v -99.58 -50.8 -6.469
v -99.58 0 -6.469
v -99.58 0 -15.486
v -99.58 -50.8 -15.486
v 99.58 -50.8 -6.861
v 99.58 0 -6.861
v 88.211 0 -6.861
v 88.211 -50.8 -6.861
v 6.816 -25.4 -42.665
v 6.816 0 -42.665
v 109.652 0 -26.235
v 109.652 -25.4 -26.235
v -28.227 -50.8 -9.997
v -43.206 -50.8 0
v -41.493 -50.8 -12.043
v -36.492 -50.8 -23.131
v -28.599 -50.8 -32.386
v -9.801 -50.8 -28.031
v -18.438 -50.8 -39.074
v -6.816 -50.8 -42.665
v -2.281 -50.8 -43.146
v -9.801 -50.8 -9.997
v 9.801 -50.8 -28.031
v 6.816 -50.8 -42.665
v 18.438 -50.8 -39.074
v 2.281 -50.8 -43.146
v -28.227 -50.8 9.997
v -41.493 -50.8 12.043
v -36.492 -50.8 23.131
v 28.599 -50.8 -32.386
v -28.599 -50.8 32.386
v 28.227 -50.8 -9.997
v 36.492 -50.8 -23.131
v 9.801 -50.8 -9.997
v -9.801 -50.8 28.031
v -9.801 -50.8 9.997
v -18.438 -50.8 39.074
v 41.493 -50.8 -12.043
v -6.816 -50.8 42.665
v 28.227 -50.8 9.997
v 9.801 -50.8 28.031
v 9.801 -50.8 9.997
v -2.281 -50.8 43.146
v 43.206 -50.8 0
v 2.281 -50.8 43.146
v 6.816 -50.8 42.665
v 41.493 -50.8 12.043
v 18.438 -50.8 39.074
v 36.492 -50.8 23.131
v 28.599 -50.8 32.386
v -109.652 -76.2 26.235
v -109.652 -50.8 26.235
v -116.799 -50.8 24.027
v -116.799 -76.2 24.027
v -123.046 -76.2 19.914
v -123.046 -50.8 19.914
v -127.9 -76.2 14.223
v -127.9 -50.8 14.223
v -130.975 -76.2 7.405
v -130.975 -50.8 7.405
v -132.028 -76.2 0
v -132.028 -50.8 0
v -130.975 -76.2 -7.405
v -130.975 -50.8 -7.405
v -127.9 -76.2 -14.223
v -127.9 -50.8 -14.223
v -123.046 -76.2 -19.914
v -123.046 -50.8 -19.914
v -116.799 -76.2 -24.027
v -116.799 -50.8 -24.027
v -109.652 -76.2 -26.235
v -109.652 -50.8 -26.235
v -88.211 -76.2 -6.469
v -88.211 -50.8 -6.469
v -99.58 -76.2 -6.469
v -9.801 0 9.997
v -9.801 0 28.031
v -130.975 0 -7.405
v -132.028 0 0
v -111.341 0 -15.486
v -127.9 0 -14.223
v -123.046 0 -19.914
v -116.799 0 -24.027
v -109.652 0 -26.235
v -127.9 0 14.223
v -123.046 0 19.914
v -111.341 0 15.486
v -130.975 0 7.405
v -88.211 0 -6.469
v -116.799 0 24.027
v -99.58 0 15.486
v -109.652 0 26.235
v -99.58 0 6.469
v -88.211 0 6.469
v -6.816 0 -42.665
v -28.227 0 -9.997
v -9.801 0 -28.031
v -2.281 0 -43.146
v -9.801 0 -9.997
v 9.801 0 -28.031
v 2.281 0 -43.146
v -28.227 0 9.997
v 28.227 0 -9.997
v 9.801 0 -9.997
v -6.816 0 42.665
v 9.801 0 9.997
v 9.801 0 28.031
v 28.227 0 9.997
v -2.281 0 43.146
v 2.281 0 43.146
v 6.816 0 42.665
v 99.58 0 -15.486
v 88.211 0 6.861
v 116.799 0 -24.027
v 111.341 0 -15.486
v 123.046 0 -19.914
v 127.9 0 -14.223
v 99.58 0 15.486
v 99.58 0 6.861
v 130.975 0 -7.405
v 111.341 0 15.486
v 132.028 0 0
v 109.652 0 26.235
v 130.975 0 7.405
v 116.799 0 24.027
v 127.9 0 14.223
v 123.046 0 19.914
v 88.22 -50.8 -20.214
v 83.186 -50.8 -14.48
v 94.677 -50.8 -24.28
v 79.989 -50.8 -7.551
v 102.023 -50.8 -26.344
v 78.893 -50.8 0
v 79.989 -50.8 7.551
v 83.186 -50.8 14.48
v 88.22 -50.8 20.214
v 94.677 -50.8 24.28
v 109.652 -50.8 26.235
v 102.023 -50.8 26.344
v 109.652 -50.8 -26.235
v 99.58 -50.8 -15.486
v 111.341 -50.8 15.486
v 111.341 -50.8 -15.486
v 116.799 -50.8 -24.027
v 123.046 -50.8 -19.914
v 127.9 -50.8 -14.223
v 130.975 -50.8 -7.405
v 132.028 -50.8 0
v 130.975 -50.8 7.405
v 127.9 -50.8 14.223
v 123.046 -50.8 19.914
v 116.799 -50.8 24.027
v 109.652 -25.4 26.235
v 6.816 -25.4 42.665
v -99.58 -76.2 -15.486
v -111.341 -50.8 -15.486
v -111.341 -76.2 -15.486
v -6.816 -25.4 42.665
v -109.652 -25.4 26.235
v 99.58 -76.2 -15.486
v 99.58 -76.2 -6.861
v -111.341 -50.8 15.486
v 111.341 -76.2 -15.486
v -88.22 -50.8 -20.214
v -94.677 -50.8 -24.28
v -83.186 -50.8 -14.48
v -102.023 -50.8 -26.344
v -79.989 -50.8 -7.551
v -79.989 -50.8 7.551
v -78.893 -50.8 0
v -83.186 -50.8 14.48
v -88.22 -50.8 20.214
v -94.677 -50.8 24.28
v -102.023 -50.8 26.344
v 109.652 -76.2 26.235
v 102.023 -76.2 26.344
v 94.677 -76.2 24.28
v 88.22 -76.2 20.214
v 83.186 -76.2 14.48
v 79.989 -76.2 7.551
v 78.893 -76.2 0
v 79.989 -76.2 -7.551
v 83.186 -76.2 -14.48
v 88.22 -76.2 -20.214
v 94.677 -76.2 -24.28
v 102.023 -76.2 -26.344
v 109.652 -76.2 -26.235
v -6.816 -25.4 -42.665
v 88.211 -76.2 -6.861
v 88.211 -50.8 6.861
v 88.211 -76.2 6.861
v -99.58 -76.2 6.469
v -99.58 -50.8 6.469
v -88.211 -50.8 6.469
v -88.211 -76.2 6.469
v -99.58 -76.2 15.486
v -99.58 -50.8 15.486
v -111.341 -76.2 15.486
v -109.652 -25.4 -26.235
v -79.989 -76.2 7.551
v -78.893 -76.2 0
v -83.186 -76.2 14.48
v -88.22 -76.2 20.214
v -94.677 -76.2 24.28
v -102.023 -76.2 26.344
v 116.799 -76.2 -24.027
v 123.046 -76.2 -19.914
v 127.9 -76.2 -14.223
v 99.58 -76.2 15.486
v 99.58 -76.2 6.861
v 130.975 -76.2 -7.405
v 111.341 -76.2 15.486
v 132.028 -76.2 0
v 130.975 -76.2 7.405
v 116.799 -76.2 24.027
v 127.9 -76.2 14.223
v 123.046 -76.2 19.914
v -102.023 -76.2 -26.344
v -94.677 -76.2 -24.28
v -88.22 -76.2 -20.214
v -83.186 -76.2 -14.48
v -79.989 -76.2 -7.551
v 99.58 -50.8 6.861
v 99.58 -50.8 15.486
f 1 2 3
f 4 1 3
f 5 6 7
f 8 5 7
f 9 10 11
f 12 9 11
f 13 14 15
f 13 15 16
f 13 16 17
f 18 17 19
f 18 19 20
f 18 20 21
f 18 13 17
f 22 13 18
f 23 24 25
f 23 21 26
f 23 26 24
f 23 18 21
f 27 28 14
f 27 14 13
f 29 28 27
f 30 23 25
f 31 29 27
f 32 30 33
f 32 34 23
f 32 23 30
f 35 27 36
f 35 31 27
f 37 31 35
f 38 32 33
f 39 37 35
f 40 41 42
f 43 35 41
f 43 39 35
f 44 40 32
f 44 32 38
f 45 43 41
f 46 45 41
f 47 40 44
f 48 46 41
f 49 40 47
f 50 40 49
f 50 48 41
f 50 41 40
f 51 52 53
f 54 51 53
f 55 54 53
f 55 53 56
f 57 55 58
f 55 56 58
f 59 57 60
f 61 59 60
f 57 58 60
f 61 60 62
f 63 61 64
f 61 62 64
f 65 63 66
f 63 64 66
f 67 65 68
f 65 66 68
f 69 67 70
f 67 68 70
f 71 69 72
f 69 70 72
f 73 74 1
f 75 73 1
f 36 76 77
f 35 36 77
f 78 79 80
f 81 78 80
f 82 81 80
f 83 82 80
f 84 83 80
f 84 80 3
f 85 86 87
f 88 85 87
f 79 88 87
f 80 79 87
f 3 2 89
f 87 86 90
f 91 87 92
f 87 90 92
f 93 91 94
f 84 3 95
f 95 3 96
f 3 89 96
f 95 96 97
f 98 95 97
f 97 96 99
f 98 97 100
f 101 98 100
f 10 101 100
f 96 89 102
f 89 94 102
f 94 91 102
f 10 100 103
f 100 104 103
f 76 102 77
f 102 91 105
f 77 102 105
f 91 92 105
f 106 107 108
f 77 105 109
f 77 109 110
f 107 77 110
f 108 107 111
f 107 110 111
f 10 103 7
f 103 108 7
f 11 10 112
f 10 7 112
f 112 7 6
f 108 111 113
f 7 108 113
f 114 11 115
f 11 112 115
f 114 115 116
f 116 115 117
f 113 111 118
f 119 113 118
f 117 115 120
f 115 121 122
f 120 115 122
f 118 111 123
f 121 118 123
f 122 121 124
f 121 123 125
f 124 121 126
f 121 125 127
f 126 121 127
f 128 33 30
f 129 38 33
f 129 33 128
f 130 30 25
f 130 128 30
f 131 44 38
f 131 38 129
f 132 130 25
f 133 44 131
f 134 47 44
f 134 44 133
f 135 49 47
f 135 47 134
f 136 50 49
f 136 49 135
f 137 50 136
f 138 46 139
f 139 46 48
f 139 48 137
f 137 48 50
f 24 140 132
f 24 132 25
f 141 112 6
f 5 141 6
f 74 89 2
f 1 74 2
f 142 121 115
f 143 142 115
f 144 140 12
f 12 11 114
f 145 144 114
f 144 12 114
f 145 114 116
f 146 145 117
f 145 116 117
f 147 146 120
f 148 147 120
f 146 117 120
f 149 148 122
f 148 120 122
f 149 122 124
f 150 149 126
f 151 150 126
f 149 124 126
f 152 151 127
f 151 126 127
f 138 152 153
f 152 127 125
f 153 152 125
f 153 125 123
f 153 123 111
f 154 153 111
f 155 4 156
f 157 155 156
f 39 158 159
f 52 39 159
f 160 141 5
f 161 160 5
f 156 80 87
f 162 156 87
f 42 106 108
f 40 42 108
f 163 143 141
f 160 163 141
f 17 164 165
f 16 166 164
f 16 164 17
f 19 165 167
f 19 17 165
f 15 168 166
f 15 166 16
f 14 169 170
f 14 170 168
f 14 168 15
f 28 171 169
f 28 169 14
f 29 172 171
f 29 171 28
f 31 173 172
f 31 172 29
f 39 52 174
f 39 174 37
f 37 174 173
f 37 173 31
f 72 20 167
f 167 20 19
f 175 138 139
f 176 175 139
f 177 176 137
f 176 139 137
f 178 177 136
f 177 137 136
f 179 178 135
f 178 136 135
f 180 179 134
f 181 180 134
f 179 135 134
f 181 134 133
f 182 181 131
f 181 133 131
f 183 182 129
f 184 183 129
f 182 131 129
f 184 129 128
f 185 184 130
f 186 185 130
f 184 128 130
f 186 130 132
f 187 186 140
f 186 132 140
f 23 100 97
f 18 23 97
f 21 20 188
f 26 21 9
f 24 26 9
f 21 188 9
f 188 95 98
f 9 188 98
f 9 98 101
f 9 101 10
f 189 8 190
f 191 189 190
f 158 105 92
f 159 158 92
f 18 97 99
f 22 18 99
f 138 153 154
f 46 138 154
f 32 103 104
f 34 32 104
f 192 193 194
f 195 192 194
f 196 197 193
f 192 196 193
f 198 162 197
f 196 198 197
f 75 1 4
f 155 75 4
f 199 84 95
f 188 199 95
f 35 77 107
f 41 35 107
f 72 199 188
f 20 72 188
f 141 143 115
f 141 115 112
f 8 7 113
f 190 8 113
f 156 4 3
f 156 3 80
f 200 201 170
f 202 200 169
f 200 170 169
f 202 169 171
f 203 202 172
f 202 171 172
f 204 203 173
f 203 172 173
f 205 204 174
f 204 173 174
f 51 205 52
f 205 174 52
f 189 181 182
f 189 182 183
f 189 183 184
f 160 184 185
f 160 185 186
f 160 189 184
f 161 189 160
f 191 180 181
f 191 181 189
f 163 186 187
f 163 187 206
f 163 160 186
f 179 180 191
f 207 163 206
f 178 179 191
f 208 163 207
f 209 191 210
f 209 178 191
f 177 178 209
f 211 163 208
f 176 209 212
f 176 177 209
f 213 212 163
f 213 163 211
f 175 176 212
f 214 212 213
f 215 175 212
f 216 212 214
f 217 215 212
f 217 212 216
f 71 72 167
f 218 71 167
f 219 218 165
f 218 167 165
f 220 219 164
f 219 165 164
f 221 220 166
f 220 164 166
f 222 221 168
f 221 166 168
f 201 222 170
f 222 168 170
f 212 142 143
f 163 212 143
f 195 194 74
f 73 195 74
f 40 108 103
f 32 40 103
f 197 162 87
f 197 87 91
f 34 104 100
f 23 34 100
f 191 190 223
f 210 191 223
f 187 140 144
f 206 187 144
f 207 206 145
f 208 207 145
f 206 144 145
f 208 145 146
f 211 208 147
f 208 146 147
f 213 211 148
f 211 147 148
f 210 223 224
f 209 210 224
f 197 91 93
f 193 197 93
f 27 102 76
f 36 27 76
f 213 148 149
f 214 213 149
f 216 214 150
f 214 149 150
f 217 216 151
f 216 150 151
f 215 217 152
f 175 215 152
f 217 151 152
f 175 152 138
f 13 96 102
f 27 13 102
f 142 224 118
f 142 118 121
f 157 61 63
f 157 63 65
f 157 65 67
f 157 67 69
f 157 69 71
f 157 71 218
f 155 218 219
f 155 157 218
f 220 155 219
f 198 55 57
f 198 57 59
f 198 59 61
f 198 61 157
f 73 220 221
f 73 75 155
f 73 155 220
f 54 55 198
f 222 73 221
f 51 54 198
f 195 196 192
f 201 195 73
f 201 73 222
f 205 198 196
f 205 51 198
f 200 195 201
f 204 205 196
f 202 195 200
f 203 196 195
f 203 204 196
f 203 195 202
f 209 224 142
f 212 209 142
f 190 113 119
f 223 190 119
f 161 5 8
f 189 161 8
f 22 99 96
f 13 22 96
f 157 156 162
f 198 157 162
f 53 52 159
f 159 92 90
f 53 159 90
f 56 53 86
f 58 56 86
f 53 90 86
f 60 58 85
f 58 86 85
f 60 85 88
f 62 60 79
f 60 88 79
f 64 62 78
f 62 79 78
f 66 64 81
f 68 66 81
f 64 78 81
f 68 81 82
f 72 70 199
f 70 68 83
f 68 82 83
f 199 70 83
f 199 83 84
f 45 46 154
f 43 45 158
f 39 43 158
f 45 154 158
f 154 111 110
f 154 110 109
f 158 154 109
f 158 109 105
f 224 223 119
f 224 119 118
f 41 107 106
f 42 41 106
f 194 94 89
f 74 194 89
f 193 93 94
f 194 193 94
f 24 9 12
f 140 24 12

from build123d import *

# Parameters (mm, degrees)
F0_W     = 11.3693646318
F0_H     = 12.9375691502
F0_H_2   = 13.7216638794
F1_DEPTH = 25.4
F2_DEPTH = 50.8
F3_DEPTH = 25.4


with BuildPart() as f1:
    # F0 (on Front) → F1 (new body)
    with BuildSketch(Plane.XZ):
        with BuildLine():
            ThreePointArc((-6.8164538385, -42.6646873664), (-43.2057819163, 0), (-6.8164538385, 42.6646873664))
            Line((-6.8164538385, 42.6646873664), (-109.6522398205, 26.2348145286))
            ThreePointArc((-109.6522398205, 26.2348145286), (-88.2201543147, 20.213751239), (-78.8932173515, 0))
            ThreePointArc((-78.8932173515, 0), (-88.2201543147, -20.213751239), (-109.6522398205, -26.2348145286))
            Line((-109.6522398205, -26.2348145286), (-6.8164538385, -42.6646873664))
        make_face()
        with BuildLine():
            ThreePointArc((6.8164538385, 42.6646873664), (32.8728596945, 28.0377368293), (43.2057819163, 0))
            ThreePointArc((43.2057819163, 0), (32.8728596945, -28.0377368293), (6.8164538385, -42.6646873664))
            Line((6.8164538385, -42.6646873664), (109.6522398205, -26.2348145286))
            ThreePointArc((109.6522398205, -26.2348145286), (78.8932173515, 0), (109.6522398205, 26.2348145286))
            Line((109.6522398205, 26.2348145286), (6.8164538385, 42.6646873664))
        make_face()
        with BuildLine():
            ThreePointArc((132.0282920518, 0), (125.6745059406, 17.240600387), (109.6522398205, 26.2348145286))
            ThreePointArc((109.6522398205, 26.2348145286), (78.8932173515, 0), (109.6522398205, -26.2348145286))
            ThreePointArc((109.6522398205, -26.2348145286), (125.6745059406, -17.240600387), (132.0282920518, 0))
        make_face()
        Polygon((88.2106725414, -6.8608319397), (88.2106725414, 6.8608319397), (99.5800371732, 6.8608319397), (99.5800371732, 15.4858744317), (111.3414722301, 15.4858744317), (111.3414722301, 6.8608319397), (122.7108368619, 6.8608319397), (122.7108368619, -6.8608319397), (111.3414722301, -6.8608319397), (111.3414722301, -15.4858744317), (99.5800371732, -15.4858744317), (99.5800371732, -6.8608319397), align=None, mode=Mode.SUBTRACT)
        with BuildLine():
            ThreePointArc((6.8164538385, -42.6646873664), (32.8728596945, -28.0377368293), (43.2057819163, 0))
            ThreePointArc((43.2057819163, 0), (32.8728596945, 28.0377368293), (6.8164538385, 42.6646873664))
            ThreePointArc((6.8164538385, 42.6646873664), (0, 43.2057819163), (-6.8164538385, 42.6646873664))
            ThreePointArc((-6.8164538385, 42.6646873664), (-43.2057819163, 0), (-6.8164538385, -42.6646873664))
            ThreePointArc((-6.8164538385, -42.6646873664), (0, -43.2057819163), (6.8164538385, -42.6646873664))
        make_face()
        Polygon((-28.2274140168, -9.9972113272), (-28.2274140168, 9.9972113272), (-9.8011827033, 9.9972113272), (-9.8011827033, 28.0313919816), (9.8011827033, 28.0313919816), (9.8011827033, 9.9972113272), (28.2274140168, 9.9972113272), (28.2274140168, -9.9972113272), (9.8011827033, -9.9972113272), (9.8011827033, -28.0313919816), (-9.8011827033, -28.0313919816), (-9.8011827033, -9.9972113272), align=None, mode=Mode.SUBTRACT)
        with BuildLine():
            ThreePointArc((-78.8932173515, 0), (-88.2201543147, 20.213751239), (-109.6522398205, 26.2348145286))
            ThreePointArc((-109.6522398205, 26.2348145286), (-132.0282920518, 0), (-109.6522398205, -26.2348145286))
            ThreePointArc((-109.6522398205, -26.2348145286), (-88.2201543147, -20.213751239), (-78.8932173515, 0))
        make_face()
        Polygon((-122.7108368619, -6.4687845751), (-122.7108368619, 6.4687845751), (-111.3414722301, 6.4687845751), (-111.3414722301, 15.4858744317), (-99.5800371732, 15.4858744317), (-99.5800371732, 6.4687845751), (-88.2106725414, 6.4687845751), (-88.2106725414, -6.4687845751), (-99.5800371732, -6.4687845751), (-99.5800371732, -15.4858744317), (-111.3414722301, -15.4858744317), (-111.3414722301, -6.4687845751), align=None, mode=Mode.SUBTRACT)
        with Locations((-117.026154546, 0)):
            Rectangle(F0_W, F0_H)
        with Locations((117.026154546, 0)):
            Rectangle(F0_W, F0_H_2)
    extrude(amount=F1_DEPTH)

    # F0 (on Front) → F2 (join)
    with BuildSketch(Plane.XZ):
        with BuildLine():
            ThreePointArc((-78.8932173515, 0), (-88.2201543147, 20.213751239), (-109.6522398205, 26.2348145286))
            ThreePointArc((-109.6522398205, 26.2348145286), (-132.0282920518, 0), (-109.6522398205, -26.2348145286))
            ThreePointArc((-109.6522398205, -26.2348145286), (-88.2201543147, -20.213751239), (-78.8932173515, 0))
        make_face()
        Polygon((-122.7108368619, -6.4687845751), (-122.7108368619, 6.4687845751), (-111.3414722301, 6.4687845751), (-111.3414722301, 15.4858744317), (-99.5800371732, 15.4858744317), (-99.5800371732, 6.4687845751), (-88.2106725414, 6.4687845751), (-88.2106725414, -6.4687845751), (-99.5800371732, -6.4687845751), (-99.5800371732, -15.4858744317), (-111.3414722301, -15.4858744317), (-111.3414722301, -6.4687845751), align=None, mode=Mode.SUBTRACT)
        with BuildLine():
            ThreePointArc((6.8164538385, -42.6646873664), (32.8728596945, -28.0377368293), (43.2057819163, 0))
            ThreePointArc((43.2057819163, 0), (32.8728596945, 28.0377368293), (6.8164538385, 42.6646873664))
            ThreePointArc((6.8164538385, 42.6646873664), (0, 43.2057819163), (-6.8164538385, 42.6646873664))
            ThreePointArc((-6.8164538385, 42.6646873664), (-43.2057819163, 0), (-6.8164538385, -42.6646873664))
            ThreePointArc((-6.8164538385, -42.6646873664), (0, -43.2057819163), (6.8164538385, -42.6646873664))
        make_face()
        Polygon((-28.2274140168, -9.9972113272), (-28.2274140168, 9.9972113272), (-9.8011827033, 9.9972113272), (-9.8011827033, 28.0313919816), (9.8011827033, 28.0313919816), (9.8011827033, 9.9972113272), (28.2274140168, 9.9972113272), (28.2274140168, -9.9972113272), (9.8011827033, -9.9972113272), (9.8011827033, -28.0313919816), (-9.8011827033, -28.0313919816), (-9.8011827033, -9.9972113272), align=None, mode=Mode.SUBTRACT)
        with BuildLine():
            ThreePointArc((132.0282920518, 0), (125.6745059406, 17.240600387), (109.6522398205, 26.2348145286))
            ThreePointArc((109.6522398205, 26.2348145286), (78.8932173515, 0), (109.6522398205, -26.2348145286))
            ThreePointArc((109.6522398205, -26.2348145286), (125.6745059406, -17.240600387), (132.0282920518, 0))
        make_face()
        Polygon((88.2106725414, -6.8608319397), (88.2106725414, 6.8608319397), (99.5800371732, 6.8608319397), (99.5800371732, 15.4858744317), (111.3414722301, 15.4858744317), (111.3414722301, 6.8608319397), (122.7108368619, 6.8608319397), (122.7108368619, -6.8608319397), (111.3414722301, -6.8608319397), (111.3414722301, -15.4858744317), (99.5800371732, -15.4858744317), (99.5800371732, -6.8608319397), align=None, mode=Mode.SUBTRACT)
        with Locations((-117.026154546, 0)):
            Rectangle(F0_W, F0_H)
        with Locations((117.026154546, 0)):
            Rectangle(F0_W, F0_H_2)
    extrude(amount=F2_DEPTH)

    # F3 (add): faces of the model
    f3_faces = [f1.faces().sort_by_distance(p)[0] for p in [
        (-59.7216205033, -25.4, 0),
        (-131.2768486191, -50.8, 0),
        (59.7216205033, -25.4, 0),
        (79.6446607843, -50.8, 0),
    ]]
    extrude(f3_faces, amount=F3_DEPTH)


solid = f1.part
